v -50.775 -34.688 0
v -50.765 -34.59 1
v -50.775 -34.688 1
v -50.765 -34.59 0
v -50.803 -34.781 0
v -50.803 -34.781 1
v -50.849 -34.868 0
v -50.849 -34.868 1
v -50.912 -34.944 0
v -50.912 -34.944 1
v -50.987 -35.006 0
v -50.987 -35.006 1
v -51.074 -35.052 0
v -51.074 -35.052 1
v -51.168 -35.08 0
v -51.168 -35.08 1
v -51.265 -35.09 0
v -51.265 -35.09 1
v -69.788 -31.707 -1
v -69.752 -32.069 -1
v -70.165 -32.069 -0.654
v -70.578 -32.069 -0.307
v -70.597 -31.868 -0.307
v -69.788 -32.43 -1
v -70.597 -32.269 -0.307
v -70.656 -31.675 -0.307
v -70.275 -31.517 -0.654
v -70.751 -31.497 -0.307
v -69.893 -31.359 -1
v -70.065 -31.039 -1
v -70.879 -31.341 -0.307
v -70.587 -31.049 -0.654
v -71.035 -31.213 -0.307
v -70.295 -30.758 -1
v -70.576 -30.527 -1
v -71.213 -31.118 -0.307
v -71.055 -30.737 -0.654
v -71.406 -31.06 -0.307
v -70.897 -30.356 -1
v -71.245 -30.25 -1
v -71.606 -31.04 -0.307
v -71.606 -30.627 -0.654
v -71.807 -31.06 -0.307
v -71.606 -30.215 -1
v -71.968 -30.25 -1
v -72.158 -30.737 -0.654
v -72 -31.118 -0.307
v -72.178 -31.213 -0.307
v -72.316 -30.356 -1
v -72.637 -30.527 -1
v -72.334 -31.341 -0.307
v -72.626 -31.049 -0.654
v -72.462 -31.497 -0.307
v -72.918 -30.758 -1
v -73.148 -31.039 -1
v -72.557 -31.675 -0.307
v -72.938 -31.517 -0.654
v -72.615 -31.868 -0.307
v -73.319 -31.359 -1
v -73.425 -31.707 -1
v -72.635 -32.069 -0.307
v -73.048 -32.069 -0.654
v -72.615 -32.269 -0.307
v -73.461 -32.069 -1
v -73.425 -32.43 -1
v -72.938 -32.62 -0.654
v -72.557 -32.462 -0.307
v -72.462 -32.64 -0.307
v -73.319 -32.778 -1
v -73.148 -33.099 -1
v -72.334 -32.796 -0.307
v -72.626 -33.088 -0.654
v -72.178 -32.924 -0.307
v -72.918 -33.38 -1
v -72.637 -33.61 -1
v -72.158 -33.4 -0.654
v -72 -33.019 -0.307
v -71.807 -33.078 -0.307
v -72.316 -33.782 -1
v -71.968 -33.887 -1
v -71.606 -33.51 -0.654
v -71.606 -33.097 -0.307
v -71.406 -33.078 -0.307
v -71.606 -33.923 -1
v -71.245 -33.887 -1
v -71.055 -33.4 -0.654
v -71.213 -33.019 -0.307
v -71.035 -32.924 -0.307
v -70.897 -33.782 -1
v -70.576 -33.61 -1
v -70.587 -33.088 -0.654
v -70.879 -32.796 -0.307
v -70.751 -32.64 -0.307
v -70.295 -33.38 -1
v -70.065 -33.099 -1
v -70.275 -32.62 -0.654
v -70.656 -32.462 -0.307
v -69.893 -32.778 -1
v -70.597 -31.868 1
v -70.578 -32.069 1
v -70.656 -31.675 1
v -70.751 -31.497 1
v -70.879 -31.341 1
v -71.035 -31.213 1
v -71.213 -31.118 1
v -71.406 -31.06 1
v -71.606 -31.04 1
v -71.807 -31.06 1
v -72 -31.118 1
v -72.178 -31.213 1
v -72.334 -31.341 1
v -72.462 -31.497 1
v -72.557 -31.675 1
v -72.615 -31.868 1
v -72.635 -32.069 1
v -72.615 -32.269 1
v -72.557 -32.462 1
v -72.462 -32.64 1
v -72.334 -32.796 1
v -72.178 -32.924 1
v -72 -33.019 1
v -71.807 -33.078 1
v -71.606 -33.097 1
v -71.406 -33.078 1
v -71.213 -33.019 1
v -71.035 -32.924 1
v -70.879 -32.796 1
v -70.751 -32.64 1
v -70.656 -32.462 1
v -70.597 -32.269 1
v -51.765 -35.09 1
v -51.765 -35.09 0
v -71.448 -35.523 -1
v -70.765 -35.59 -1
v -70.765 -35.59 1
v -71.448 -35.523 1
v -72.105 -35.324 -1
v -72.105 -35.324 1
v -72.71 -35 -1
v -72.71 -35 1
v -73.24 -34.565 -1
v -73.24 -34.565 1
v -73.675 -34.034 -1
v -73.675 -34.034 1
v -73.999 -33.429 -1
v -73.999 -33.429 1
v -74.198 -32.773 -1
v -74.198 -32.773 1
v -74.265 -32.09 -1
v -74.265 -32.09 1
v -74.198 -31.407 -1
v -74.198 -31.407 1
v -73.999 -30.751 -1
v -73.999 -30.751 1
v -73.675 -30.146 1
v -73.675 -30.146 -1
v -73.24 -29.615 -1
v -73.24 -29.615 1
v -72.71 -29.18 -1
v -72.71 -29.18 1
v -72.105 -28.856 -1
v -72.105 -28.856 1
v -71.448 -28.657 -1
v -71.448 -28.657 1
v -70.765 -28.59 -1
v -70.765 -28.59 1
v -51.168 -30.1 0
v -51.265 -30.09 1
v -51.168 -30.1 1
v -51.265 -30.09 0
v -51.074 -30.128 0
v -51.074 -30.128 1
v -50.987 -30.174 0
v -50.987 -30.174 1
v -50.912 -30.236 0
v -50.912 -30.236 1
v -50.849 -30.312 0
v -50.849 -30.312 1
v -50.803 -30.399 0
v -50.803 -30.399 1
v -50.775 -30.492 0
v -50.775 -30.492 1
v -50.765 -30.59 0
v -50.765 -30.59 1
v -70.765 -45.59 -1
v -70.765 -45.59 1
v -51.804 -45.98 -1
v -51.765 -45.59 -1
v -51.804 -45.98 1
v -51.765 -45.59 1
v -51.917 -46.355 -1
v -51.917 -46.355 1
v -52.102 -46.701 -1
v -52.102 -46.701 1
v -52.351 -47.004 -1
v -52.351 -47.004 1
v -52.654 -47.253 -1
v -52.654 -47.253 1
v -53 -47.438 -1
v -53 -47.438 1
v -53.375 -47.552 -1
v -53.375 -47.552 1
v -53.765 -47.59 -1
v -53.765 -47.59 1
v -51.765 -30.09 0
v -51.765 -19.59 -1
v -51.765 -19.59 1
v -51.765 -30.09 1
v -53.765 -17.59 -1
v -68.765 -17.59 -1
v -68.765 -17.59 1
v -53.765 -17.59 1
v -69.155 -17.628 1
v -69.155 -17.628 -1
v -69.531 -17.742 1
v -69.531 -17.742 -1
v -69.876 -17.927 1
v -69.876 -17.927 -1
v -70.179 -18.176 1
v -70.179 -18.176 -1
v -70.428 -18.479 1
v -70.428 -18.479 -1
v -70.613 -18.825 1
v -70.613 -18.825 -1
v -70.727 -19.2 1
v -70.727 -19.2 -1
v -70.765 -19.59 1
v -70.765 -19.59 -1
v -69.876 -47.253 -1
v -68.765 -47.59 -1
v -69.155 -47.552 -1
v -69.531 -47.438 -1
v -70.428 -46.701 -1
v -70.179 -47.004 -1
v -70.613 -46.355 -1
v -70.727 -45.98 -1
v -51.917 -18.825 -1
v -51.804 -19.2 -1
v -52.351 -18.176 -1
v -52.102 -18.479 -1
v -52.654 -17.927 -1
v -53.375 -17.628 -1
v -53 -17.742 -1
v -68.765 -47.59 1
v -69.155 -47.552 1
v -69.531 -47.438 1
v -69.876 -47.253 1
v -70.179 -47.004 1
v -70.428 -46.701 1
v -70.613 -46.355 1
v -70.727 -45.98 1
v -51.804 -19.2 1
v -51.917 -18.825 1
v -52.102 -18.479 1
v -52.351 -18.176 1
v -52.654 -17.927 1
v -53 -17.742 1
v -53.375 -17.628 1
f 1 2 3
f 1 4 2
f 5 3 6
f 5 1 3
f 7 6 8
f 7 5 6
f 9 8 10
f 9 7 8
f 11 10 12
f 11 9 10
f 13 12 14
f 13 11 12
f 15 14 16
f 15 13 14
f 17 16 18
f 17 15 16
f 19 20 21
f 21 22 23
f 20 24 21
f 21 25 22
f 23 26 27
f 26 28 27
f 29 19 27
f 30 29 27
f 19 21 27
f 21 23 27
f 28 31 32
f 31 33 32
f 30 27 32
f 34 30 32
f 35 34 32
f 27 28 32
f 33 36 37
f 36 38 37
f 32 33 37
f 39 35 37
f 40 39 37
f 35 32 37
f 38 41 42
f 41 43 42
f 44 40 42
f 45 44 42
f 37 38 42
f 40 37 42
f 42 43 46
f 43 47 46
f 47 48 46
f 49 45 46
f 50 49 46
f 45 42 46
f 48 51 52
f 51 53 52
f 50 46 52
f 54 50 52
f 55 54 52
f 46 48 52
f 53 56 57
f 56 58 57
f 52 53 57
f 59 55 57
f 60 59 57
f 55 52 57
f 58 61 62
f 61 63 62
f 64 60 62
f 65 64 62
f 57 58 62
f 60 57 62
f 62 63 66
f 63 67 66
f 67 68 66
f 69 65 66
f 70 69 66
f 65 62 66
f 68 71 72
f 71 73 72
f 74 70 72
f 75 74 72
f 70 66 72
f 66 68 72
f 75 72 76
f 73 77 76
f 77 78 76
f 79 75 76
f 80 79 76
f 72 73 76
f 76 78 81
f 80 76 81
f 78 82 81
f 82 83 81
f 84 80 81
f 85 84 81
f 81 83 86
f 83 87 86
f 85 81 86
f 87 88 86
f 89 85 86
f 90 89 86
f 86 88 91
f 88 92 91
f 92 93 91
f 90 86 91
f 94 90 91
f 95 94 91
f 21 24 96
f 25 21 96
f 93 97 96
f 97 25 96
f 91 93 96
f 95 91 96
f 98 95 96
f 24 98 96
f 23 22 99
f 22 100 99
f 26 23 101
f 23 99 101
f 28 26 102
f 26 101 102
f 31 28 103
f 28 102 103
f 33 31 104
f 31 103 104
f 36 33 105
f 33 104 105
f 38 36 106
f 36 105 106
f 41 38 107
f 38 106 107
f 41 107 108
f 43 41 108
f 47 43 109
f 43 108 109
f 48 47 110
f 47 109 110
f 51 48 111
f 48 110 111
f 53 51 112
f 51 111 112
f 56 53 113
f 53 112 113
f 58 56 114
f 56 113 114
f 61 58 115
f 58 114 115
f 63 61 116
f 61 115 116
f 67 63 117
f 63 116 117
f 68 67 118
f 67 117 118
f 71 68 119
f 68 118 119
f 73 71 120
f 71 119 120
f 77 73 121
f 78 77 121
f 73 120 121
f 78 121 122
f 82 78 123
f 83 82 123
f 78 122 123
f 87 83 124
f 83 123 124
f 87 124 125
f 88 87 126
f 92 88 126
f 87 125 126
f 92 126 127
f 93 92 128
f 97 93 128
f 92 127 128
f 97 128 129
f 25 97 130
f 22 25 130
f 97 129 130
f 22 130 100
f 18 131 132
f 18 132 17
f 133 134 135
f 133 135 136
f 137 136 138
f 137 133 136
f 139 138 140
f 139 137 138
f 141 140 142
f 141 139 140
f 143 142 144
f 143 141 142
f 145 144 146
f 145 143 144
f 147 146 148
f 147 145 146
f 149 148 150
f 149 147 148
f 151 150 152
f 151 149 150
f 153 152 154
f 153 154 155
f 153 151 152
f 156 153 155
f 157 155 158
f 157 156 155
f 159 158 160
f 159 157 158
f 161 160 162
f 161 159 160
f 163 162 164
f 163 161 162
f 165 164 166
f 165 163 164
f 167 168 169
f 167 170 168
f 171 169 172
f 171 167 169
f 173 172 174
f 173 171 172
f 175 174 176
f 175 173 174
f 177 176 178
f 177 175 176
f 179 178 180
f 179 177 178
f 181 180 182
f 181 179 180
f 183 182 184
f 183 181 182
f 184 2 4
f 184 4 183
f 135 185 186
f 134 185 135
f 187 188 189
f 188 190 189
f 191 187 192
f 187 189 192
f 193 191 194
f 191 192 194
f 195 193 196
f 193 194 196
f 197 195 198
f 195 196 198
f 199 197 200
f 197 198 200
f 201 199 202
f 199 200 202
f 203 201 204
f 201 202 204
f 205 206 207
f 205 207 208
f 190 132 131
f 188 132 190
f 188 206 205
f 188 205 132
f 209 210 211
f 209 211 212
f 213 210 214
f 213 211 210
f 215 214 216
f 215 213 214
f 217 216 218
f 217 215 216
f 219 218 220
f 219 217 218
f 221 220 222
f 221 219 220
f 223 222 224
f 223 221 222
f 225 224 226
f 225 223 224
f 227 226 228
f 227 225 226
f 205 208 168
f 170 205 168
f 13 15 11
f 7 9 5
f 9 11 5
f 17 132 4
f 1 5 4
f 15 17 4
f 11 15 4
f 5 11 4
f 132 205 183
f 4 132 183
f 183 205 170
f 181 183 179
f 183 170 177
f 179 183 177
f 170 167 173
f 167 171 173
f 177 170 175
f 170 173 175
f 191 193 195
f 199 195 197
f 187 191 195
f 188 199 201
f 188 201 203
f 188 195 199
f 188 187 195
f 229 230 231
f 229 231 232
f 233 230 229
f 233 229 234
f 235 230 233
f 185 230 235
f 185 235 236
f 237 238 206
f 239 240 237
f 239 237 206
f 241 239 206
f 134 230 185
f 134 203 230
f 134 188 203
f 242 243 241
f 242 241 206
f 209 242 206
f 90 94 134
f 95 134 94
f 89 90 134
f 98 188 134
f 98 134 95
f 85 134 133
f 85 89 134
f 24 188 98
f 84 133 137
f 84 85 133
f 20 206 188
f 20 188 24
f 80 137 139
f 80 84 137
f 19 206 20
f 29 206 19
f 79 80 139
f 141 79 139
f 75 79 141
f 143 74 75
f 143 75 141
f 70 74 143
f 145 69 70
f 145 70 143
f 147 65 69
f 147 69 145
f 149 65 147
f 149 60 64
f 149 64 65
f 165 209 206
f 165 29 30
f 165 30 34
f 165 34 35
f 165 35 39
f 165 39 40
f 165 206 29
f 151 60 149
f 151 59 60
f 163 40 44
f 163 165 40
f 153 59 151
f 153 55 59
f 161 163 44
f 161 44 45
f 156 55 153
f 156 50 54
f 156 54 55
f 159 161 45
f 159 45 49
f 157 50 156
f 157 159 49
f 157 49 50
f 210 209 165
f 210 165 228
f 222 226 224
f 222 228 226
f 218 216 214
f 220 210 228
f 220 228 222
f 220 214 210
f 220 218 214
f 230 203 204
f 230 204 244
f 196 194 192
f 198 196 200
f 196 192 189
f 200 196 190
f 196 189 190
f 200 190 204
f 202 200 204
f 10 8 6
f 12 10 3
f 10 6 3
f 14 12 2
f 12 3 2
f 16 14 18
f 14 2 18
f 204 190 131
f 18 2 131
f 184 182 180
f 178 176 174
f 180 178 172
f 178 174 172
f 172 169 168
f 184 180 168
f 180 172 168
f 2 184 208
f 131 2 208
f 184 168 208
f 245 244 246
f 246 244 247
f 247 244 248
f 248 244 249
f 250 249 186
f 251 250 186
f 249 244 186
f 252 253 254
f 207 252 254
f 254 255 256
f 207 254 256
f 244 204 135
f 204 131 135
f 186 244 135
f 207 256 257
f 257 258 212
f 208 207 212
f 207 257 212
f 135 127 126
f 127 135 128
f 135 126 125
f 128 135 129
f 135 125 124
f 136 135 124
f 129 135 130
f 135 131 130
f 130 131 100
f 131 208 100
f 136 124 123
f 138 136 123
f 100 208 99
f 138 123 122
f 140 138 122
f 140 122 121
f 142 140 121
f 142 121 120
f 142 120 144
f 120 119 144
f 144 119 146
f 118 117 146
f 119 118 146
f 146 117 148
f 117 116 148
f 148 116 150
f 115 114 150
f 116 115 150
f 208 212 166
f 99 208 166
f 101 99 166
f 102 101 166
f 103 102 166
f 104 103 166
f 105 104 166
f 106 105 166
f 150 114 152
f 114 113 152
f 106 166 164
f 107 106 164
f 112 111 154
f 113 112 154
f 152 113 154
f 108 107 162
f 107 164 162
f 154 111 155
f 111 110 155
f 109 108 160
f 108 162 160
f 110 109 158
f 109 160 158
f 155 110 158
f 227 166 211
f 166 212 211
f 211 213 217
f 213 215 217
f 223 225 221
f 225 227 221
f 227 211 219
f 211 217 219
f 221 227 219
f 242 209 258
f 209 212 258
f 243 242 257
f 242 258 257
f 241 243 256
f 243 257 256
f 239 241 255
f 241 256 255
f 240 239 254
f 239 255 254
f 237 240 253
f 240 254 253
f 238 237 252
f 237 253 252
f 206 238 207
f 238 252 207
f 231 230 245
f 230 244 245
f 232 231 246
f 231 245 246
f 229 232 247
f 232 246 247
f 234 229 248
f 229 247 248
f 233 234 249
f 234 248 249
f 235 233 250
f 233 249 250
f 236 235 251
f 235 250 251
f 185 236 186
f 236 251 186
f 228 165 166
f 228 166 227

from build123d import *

# Parameters (mm, degrees)
BOSS_EXTRUDE1_DEPTH                               = 1
BOSS_EXTRUDE1_DEPTH_BACK                          = 1
SKETCH2_W                                         = 1
SKETCH2_H                                         = 5
BOSS_EXTRUDE3_DEPTH                               = 1
FILLET1_R                                         = 2
FILLET2_R                                         = 0.5
CSK_FOR_1_FLAT_HEAD_MACHINE_SCREW_100_D           = 2.0574
CSK_FOR_1_FLAT_HEAD_MACHINE_SCREW_100_DEPTH       = 5.381894681
CSK_FOR_1_FLAT_HEAD_MACHINE_SCREW_100_CSINK_D     = 3.7084
CSK_FOR_1_FLAT_HEAD_MACHINE_SCREW_100_CSINK_ANGLE = 100
CSK_FOR_1_FLAT_HEAD_MACHINE_SCREW_100_TIP         = 0.618105319


with BuildPart() as part:
    # Sketch1 → Boss-Extrude1 (new, two sides: drawn at the far end of the back side and taken through both)
    with BuildSketch(Plane.XY.offset(-BOSS_EXTRUDE1_DEPTH_BACK)):
        with BuildLine():
            Line((-70.765177629, -17.59), (-51.765177629, -17.59))
            Line((-51.765177629, -17.59), (-51.765177629, -47.59))
            Line((-51.765177629, -47.59), (-70.765177629, -47.59))
            Line((-70.765177629, -47.59), (-70.765177629, -35.59))
            ThreePointArc((-70.765177629, -35.59), (-74.265177629, -32.09), (-70.765177629, -28.59))
            Line((-70.765177629, -28.59), (-70.765177629, -17.59))
        make_face()
    extrude(amount=BOSS_EXTRUDE1_DEPTH + BOSS_EXTRUDE1_DEPTH_BACK)

    # Sketch2 → Boss-Extrude3 (add)
    with BuildSketch(Plane.XY.offset(1)):
        with Locations((-51.265177629, -32.59)):
            Rectangle(SKETCH2_W, SKETCH2_H)
    extrude(amount=-BOSS_EXTRUDE3_DEPTH)

    # Fillet1
    fillet1_edges = [part.edges().sort_by_distance(p)[0] for p in [
        (-70.765177629, -17.59, 0),
        (-51.765177629, -17.59, 0),
        (-51.765177629, -47.59, 0),
        (-70.765177629, -47.59, 0),
    ]]
    fillet(fillet1_edges, radius=FILLET1_R)

    # Fillet2
    fillet2_edges = [part.edges().sort_by_distance(p)[0] for p in [
        (-50.765177629, -30.09, 0.5),
        (-50.765177629, -35.09, 0.5),
    ]]
    fillet(fillet2_edges, radius=FILLET2_R)

    # CSK for #1 Flat Head Machine Screw (100)1
    with Locations(Plane(origin=(-71.606429364, -32.068746038, -1), x_dir=(-1, 0, 0), z_dir=(0, 0, -1))):
        with Locations((0, 0)):
            CounterSinkHole(CSK_FOR_1_FLAT_HEAD_MACHINE_SCREW_100_D / 2, CSK_FOR_1_FLAT_HEAD_MACHINE_SCREW_100_CSINK_D / 2, depth=CSK_FOR_1_FLAT_HEAD_MACHINE_SCREW_100_DEPTH, counter_sink_angle=CSK_FOR_1_FLAT_HEAD_MACHINE_SCREW_100_CSINK_ANGLE)
            with Locations((0, 0, -(CSK_FOR_1_FLAT_HEAD_MACHINE_SCREW_100_DEPTH + CSK_FOR_1_FLAT_HEAD_MACHINE_SCREW_100_TIP / 2))):  # 118° drill point
                Cone(0, CSK_FOR_1_FLAT_HEAD_MACHINE_SCREW_100_D / 2, CSK_FOR_1_FLAT_HEAD_MACHINE_SCREW_100_TIP, mode=Mode.SUBTRACT)


solid = part.part
